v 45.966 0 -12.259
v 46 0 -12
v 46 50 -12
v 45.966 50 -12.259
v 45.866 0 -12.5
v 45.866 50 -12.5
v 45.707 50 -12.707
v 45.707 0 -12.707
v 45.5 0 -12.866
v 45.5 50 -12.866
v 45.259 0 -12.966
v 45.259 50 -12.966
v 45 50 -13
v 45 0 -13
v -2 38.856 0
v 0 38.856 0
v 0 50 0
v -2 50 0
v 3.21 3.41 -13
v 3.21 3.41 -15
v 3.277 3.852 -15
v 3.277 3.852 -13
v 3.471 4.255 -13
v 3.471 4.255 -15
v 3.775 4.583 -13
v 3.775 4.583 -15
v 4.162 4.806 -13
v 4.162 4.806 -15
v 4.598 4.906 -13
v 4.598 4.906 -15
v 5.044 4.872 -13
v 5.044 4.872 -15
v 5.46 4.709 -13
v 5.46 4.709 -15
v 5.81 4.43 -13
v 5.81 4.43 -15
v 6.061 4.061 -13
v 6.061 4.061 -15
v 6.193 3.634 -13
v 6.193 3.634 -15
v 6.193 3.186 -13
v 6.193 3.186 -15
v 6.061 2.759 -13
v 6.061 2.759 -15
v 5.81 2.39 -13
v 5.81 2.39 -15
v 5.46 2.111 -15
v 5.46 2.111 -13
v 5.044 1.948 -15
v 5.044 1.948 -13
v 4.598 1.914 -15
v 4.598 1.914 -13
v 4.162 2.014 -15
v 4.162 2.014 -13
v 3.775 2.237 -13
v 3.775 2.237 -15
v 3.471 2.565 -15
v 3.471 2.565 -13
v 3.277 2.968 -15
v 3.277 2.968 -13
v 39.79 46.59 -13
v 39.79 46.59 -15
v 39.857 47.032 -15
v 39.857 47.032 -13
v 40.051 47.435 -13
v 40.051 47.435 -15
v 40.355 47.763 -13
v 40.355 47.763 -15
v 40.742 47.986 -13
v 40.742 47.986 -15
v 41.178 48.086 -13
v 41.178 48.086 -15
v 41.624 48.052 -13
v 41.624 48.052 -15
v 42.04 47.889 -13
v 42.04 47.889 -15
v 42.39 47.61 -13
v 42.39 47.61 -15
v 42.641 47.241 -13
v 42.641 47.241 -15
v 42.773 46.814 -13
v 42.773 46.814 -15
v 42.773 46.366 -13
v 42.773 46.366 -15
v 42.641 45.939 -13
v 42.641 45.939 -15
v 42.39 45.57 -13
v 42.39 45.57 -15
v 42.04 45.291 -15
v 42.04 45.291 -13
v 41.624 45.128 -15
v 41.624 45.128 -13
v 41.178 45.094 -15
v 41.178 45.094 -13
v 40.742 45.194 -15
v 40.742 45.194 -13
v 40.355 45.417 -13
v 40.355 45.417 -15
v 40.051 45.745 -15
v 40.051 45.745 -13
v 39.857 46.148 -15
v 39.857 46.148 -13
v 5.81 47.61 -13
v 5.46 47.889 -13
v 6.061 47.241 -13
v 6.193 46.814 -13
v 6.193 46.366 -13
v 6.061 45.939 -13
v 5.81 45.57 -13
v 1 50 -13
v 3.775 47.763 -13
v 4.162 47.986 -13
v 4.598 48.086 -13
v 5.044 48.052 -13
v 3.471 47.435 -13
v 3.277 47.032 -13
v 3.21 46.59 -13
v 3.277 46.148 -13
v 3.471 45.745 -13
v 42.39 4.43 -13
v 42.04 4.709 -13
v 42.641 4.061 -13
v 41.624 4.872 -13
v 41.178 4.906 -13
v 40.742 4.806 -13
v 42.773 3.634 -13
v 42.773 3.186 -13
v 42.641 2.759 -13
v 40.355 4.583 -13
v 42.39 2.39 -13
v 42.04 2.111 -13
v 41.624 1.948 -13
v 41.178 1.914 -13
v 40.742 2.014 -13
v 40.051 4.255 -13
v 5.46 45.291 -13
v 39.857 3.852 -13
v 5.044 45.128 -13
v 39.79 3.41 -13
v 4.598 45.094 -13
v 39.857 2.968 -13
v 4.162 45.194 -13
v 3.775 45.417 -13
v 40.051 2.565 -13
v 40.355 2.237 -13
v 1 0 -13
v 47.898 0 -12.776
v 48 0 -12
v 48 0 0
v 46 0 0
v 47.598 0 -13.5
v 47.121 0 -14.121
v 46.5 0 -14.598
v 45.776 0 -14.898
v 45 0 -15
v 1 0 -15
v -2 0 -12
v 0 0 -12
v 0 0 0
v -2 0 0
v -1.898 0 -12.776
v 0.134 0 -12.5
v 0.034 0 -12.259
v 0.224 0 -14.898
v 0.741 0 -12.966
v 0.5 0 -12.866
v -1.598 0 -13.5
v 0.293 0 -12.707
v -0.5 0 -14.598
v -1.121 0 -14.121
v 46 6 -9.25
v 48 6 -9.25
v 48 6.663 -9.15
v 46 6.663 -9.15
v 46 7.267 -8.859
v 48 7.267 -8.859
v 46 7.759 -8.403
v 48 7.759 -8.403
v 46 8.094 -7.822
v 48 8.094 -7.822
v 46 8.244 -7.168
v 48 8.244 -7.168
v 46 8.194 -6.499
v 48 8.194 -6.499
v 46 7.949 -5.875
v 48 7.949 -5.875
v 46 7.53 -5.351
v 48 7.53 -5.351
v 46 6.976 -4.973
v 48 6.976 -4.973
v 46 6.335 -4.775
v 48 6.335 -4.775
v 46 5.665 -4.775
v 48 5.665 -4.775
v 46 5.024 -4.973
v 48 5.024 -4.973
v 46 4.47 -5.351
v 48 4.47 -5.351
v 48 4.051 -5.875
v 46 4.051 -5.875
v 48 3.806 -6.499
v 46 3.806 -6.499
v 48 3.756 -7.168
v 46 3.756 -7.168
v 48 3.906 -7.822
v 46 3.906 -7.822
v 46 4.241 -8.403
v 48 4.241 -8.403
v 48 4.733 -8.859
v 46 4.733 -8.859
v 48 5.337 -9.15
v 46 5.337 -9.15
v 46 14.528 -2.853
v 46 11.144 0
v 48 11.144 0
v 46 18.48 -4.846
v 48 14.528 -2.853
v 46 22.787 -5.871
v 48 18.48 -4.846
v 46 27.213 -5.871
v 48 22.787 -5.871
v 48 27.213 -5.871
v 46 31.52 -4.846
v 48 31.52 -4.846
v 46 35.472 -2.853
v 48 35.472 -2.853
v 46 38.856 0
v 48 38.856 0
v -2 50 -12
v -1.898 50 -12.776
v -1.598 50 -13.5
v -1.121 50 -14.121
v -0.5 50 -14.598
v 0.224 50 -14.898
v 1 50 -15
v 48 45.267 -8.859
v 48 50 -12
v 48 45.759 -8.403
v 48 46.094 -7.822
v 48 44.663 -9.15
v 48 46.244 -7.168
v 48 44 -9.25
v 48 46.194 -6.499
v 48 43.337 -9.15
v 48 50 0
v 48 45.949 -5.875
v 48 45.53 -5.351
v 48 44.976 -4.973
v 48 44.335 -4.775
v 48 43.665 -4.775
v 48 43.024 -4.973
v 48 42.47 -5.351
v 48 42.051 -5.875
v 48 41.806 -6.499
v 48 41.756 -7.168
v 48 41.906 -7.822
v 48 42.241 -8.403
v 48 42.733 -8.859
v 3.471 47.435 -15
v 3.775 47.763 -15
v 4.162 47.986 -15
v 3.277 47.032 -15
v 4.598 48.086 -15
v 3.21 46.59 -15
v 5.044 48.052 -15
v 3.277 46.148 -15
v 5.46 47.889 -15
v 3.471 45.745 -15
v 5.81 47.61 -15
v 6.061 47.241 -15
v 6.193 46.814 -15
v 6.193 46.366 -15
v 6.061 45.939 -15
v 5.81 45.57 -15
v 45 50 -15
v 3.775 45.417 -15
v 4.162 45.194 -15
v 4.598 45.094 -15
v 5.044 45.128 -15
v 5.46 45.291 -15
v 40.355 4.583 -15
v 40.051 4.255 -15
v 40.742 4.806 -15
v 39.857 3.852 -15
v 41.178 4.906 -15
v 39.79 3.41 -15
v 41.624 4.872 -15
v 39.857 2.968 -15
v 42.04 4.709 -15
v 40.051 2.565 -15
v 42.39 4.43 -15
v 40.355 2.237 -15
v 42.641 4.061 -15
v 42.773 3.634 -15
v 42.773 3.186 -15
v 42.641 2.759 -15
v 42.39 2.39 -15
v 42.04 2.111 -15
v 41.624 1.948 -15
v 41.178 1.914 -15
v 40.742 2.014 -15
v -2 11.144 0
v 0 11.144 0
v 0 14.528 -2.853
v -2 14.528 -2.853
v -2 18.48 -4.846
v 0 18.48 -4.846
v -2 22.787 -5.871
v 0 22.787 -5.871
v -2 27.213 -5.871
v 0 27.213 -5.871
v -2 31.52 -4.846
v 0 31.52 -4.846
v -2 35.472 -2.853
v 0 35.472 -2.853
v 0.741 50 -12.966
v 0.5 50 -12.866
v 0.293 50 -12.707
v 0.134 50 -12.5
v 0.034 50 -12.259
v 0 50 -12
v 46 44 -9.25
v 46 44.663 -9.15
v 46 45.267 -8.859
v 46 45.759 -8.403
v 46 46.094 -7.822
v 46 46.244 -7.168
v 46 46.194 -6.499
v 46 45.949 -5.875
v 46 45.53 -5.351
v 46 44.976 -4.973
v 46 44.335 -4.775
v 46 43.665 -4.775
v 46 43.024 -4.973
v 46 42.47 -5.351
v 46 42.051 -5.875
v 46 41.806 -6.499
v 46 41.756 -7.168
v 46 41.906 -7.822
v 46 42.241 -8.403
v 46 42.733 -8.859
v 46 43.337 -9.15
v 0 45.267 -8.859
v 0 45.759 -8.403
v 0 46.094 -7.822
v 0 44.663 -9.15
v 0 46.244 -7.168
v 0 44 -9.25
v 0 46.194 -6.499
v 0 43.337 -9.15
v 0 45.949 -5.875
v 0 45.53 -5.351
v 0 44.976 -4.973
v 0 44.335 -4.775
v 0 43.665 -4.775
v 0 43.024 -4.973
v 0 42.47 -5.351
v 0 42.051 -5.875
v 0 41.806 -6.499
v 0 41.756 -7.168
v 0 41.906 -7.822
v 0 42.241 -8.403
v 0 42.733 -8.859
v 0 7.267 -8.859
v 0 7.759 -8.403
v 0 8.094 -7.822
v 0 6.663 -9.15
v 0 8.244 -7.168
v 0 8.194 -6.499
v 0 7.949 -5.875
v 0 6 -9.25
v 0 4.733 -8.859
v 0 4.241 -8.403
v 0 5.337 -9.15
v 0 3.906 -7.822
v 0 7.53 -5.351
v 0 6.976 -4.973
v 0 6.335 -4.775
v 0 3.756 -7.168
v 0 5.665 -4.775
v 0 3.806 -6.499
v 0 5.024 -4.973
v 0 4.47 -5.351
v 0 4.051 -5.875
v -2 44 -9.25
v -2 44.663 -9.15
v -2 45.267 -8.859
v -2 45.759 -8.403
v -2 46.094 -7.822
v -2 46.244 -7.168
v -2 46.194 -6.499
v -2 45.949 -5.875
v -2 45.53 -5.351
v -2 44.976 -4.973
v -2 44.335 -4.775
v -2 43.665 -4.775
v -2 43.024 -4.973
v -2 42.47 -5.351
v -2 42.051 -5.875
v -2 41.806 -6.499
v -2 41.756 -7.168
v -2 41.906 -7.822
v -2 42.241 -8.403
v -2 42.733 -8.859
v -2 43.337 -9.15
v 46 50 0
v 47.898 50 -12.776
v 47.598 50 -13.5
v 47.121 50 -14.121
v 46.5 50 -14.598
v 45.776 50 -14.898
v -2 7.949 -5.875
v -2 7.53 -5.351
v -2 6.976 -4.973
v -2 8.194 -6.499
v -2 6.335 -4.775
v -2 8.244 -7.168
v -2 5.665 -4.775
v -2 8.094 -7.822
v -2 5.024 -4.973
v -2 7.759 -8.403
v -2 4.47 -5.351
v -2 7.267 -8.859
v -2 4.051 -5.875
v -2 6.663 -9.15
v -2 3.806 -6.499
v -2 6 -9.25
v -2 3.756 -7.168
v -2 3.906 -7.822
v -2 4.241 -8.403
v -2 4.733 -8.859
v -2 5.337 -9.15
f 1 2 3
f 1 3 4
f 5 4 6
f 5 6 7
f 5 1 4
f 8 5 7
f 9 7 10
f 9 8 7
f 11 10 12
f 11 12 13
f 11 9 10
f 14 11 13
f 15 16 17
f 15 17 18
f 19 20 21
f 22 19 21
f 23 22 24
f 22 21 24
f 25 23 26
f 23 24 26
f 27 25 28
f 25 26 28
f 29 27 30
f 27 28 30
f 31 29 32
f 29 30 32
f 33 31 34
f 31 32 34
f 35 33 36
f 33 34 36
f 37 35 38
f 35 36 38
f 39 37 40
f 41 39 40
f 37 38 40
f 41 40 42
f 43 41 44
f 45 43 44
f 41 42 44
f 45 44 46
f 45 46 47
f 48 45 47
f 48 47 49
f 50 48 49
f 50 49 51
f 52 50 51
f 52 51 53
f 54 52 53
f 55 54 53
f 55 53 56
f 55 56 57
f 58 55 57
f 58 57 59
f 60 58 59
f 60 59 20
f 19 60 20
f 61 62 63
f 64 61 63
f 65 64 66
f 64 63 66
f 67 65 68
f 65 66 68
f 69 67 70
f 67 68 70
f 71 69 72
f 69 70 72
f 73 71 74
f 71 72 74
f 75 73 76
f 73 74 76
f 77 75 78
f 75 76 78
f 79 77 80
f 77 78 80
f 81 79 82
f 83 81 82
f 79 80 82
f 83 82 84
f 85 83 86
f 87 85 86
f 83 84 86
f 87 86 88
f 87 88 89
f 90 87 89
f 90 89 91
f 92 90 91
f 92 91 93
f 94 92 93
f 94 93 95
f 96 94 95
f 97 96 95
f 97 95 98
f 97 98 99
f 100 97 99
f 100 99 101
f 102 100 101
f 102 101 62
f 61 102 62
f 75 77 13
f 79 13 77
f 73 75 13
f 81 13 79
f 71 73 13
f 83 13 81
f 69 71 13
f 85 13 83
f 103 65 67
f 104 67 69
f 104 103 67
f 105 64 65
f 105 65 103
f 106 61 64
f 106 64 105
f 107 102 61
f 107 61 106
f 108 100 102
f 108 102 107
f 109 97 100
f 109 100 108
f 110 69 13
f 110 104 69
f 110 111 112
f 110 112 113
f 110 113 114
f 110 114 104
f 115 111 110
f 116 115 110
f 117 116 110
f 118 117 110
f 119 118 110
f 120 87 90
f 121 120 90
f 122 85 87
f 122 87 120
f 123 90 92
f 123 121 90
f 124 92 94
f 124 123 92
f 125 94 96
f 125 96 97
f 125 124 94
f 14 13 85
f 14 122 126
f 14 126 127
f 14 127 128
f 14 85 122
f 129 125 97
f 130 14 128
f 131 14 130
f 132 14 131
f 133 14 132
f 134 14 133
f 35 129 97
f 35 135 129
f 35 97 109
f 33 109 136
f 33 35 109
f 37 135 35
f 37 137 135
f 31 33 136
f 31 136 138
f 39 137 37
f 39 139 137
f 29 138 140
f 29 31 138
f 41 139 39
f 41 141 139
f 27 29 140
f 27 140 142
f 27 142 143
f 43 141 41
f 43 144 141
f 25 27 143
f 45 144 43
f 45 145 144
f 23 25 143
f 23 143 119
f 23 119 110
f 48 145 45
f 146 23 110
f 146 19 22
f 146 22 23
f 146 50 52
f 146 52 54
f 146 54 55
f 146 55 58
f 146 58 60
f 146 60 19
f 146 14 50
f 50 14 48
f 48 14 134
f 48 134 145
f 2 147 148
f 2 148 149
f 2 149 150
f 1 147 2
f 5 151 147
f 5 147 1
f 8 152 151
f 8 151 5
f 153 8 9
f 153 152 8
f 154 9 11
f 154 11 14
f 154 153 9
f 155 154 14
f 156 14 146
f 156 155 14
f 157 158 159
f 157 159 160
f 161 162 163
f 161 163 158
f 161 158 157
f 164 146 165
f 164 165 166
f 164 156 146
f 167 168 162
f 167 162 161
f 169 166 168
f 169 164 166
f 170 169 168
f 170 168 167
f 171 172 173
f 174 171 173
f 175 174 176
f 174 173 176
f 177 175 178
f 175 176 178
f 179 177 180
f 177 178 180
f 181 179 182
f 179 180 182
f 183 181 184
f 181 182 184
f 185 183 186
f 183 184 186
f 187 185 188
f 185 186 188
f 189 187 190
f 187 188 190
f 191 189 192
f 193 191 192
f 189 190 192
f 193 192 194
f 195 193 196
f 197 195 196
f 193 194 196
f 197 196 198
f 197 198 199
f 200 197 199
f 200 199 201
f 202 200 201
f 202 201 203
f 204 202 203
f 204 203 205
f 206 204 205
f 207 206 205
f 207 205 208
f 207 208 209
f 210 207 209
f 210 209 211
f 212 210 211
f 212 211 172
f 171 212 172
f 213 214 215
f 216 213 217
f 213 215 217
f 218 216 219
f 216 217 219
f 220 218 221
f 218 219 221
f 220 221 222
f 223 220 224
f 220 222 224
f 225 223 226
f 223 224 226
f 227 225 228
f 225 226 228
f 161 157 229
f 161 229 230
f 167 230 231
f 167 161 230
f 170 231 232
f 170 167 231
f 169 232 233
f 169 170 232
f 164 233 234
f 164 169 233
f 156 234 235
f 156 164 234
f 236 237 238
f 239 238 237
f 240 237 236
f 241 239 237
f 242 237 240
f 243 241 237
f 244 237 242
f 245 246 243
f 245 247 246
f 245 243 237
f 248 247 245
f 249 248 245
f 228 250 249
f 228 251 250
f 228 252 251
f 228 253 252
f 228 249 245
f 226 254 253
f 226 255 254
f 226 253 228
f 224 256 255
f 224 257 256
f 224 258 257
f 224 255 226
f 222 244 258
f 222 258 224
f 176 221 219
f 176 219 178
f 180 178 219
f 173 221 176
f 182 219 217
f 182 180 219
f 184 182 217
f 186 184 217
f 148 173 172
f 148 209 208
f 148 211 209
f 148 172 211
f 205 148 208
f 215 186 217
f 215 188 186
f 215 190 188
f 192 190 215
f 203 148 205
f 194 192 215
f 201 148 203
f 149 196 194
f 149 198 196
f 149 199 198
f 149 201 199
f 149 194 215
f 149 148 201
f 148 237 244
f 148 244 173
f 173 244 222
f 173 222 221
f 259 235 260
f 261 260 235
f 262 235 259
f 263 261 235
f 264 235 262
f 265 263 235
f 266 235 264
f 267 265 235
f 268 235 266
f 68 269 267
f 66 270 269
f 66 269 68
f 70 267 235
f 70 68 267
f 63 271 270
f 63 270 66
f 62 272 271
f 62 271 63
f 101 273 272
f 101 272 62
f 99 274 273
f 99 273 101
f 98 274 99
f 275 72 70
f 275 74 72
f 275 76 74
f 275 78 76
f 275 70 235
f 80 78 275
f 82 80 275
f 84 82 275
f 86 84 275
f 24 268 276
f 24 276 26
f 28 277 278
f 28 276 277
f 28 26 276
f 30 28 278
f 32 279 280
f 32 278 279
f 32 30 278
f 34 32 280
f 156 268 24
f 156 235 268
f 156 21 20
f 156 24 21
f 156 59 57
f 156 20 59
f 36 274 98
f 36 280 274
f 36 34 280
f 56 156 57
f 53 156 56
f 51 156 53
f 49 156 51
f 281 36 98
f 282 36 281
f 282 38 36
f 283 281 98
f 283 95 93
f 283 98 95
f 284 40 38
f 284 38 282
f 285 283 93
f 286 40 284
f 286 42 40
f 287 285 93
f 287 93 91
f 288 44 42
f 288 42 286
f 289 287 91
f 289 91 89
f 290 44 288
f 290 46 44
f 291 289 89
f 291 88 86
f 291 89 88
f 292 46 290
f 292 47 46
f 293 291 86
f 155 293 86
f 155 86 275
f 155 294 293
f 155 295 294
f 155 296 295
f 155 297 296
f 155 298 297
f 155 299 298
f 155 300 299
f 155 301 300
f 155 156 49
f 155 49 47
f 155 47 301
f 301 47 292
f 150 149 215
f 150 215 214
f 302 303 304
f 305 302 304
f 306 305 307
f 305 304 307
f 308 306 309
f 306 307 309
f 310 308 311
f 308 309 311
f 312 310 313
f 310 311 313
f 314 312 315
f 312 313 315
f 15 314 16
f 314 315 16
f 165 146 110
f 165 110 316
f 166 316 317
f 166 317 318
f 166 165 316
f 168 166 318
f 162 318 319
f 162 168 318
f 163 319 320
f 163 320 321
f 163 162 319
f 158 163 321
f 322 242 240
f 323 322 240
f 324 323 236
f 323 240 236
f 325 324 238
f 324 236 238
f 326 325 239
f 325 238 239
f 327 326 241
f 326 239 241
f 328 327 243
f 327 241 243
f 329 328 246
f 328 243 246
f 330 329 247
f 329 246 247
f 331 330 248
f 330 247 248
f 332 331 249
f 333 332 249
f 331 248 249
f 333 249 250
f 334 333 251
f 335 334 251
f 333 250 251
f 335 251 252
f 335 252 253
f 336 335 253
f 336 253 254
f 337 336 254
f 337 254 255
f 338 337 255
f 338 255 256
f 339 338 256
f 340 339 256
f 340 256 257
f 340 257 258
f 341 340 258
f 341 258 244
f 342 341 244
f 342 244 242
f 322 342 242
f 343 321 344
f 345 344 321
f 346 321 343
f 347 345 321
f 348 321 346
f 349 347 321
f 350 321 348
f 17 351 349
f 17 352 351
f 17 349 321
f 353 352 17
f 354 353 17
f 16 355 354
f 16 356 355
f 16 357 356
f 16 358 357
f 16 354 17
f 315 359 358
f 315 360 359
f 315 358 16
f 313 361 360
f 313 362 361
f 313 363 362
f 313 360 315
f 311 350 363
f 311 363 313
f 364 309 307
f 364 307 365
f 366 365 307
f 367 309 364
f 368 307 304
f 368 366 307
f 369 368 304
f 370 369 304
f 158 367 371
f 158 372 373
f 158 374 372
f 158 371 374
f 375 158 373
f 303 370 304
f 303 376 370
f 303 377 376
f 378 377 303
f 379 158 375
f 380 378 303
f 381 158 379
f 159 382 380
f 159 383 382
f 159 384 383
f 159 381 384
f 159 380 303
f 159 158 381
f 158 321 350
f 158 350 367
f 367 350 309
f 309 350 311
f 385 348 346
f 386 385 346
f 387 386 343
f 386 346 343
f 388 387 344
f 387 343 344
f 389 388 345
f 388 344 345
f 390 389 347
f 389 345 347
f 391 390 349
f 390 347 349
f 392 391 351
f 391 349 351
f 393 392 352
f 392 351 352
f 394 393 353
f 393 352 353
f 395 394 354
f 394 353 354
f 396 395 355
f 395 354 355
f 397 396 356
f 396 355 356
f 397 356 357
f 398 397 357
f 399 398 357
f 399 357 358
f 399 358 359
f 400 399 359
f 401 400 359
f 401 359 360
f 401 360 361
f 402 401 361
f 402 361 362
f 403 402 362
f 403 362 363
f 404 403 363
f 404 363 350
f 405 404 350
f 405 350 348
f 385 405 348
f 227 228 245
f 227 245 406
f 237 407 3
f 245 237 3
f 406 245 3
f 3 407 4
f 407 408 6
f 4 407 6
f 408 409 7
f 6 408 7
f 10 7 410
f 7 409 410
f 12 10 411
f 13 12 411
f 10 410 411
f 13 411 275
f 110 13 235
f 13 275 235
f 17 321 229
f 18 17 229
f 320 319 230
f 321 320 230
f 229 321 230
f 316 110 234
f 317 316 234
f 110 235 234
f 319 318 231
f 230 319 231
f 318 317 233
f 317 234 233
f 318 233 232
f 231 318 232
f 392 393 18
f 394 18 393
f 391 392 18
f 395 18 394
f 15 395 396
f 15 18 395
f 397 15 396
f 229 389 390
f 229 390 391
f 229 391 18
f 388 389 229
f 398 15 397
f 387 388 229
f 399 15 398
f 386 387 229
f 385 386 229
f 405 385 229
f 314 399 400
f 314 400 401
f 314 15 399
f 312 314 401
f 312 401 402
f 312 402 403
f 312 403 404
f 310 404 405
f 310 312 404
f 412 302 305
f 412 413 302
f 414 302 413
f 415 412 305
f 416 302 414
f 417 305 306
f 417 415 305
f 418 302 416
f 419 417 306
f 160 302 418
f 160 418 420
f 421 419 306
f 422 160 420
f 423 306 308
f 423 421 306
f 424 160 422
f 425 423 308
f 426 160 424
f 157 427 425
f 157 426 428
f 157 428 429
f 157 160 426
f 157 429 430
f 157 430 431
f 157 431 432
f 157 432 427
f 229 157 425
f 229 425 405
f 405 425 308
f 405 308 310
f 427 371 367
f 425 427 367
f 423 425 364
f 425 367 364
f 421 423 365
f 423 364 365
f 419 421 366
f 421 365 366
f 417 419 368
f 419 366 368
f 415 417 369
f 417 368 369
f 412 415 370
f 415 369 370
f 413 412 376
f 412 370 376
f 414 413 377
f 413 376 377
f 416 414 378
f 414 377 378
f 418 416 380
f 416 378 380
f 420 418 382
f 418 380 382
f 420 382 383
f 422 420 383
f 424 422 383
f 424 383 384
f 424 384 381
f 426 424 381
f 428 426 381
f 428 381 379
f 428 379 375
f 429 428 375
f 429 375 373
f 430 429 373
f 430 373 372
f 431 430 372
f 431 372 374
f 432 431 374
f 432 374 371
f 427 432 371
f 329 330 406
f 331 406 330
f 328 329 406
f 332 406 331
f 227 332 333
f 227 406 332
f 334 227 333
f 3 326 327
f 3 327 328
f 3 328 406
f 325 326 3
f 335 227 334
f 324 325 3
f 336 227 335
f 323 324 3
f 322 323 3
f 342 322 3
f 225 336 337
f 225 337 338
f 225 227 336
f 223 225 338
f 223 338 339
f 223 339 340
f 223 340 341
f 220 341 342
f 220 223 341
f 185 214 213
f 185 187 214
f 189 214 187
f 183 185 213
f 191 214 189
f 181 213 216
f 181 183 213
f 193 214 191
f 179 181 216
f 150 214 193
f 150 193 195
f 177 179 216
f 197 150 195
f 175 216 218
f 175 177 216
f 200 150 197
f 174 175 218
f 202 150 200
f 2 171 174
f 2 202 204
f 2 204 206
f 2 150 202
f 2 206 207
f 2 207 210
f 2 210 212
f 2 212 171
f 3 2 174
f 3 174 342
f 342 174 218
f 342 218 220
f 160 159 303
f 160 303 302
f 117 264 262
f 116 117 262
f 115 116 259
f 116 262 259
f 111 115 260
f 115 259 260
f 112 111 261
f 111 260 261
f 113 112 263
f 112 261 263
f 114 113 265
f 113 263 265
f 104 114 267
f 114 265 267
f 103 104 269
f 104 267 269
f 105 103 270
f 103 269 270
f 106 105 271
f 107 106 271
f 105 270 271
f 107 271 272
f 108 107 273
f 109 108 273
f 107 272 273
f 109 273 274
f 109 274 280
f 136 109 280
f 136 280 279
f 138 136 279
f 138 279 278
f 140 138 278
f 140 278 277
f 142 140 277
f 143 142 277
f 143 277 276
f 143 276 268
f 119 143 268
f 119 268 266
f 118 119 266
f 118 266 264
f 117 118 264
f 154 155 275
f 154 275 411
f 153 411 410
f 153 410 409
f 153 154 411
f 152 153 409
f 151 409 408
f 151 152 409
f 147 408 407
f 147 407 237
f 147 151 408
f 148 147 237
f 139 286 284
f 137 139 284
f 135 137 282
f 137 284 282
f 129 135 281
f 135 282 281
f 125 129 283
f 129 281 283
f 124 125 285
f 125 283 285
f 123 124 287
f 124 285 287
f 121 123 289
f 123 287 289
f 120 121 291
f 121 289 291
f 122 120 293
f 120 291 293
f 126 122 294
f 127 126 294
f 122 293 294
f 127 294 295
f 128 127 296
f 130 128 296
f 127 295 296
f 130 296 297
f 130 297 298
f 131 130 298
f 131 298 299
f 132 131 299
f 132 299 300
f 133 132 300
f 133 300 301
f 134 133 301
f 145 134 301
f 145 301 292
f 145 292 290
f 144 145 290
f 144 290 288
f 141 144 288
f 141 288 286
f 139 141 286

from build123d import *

# Parameters (mm, degrees)
BOSS_EXTRUDE1_DEPTH = 50
SKETCH2_R           = 19
SKETCH2_R_2         = 2.25
CUT_EXTRUDE1_DEPTH  = 73.284161474
SKETCH3_R           = 1.5
CUT_EXTRUDE2_DEPTH  = 10


with BuildPart() as part:
    # Sketch1 → Boss-Extrude1 (new body)
    with BuildSketch(Plane(origin=(0, 0, 0), x_dir=(1, 0, 0), z_dir=(0, 1, 0))):
        with BuildLine():
            Line((-2, 0), (-2, 12))
            ThreePointArc((-2, 12), (-1.121320344, 14.121320344), (1, 15))
            Line((1, 15), (45, 15))
            ThreePointArc((45, 15), (47.121320344, 14.121320344), (48, 12))
            Line((48, 12), (48, 0))
            Line((48, 0), (46, 0))
            Line((46, 0), (46, 12))
            ThreePointArc((46, 12), (45.707106781, 12.707106781), (45, 13))
            Line((45, 13), (1, 13))
            ThreePointArc((1, 13), (0.292893219, 12.707106781), (0, 12))
            Line((0, 12), (0, 0))
            Line((0, 0), (-2, 0))
        make_face()
    extrude(amount=BOSS_EXTRUDE1_DEPTH)

    # Sketch2 → Cut-Extrude1 (cut, through all)
    with BuildSketch(Plane(origin=(48, 0, 0), x_dir=(0, 0, -1), z_dir=(1, 0, 0))):
        with Locations((-13, 25)):
            Circle(SKETCH2_R)
        with Locations((7, 44)):
            Circle(SKETCH2_R_2)
        with Locations((7, 6)):
            Circle(SKETCH2_R_2)
    extrude(amount=-CUT_EXTRUDE1_DEPTH, mode=Mode.SUBTRACT)

    # Sketch3 → Cut-Extrude2 (cut)
    with BuildSketch(Plane(origin=(0, 0, -15), x_dir=(-1, 0, 0), z_dir=(0, 0, -1))):
        with Locations((-41.29, 46.59)):
            Circle(SKETCH3_R)
        with Locations((-4.71, 46.59)):
            Circle(SKETCH3_R)
        with Locations((-4.71, 3.41)):
            Circle(SKETCH3_R)
        with Locations((-41.29, 3.41)):
            Circle(SKETCH3_R)
    extrude(amount=-CUT_EXTRUDE2_DEPTH, mode=Mode.SUBTRACT)


solid = part.part
